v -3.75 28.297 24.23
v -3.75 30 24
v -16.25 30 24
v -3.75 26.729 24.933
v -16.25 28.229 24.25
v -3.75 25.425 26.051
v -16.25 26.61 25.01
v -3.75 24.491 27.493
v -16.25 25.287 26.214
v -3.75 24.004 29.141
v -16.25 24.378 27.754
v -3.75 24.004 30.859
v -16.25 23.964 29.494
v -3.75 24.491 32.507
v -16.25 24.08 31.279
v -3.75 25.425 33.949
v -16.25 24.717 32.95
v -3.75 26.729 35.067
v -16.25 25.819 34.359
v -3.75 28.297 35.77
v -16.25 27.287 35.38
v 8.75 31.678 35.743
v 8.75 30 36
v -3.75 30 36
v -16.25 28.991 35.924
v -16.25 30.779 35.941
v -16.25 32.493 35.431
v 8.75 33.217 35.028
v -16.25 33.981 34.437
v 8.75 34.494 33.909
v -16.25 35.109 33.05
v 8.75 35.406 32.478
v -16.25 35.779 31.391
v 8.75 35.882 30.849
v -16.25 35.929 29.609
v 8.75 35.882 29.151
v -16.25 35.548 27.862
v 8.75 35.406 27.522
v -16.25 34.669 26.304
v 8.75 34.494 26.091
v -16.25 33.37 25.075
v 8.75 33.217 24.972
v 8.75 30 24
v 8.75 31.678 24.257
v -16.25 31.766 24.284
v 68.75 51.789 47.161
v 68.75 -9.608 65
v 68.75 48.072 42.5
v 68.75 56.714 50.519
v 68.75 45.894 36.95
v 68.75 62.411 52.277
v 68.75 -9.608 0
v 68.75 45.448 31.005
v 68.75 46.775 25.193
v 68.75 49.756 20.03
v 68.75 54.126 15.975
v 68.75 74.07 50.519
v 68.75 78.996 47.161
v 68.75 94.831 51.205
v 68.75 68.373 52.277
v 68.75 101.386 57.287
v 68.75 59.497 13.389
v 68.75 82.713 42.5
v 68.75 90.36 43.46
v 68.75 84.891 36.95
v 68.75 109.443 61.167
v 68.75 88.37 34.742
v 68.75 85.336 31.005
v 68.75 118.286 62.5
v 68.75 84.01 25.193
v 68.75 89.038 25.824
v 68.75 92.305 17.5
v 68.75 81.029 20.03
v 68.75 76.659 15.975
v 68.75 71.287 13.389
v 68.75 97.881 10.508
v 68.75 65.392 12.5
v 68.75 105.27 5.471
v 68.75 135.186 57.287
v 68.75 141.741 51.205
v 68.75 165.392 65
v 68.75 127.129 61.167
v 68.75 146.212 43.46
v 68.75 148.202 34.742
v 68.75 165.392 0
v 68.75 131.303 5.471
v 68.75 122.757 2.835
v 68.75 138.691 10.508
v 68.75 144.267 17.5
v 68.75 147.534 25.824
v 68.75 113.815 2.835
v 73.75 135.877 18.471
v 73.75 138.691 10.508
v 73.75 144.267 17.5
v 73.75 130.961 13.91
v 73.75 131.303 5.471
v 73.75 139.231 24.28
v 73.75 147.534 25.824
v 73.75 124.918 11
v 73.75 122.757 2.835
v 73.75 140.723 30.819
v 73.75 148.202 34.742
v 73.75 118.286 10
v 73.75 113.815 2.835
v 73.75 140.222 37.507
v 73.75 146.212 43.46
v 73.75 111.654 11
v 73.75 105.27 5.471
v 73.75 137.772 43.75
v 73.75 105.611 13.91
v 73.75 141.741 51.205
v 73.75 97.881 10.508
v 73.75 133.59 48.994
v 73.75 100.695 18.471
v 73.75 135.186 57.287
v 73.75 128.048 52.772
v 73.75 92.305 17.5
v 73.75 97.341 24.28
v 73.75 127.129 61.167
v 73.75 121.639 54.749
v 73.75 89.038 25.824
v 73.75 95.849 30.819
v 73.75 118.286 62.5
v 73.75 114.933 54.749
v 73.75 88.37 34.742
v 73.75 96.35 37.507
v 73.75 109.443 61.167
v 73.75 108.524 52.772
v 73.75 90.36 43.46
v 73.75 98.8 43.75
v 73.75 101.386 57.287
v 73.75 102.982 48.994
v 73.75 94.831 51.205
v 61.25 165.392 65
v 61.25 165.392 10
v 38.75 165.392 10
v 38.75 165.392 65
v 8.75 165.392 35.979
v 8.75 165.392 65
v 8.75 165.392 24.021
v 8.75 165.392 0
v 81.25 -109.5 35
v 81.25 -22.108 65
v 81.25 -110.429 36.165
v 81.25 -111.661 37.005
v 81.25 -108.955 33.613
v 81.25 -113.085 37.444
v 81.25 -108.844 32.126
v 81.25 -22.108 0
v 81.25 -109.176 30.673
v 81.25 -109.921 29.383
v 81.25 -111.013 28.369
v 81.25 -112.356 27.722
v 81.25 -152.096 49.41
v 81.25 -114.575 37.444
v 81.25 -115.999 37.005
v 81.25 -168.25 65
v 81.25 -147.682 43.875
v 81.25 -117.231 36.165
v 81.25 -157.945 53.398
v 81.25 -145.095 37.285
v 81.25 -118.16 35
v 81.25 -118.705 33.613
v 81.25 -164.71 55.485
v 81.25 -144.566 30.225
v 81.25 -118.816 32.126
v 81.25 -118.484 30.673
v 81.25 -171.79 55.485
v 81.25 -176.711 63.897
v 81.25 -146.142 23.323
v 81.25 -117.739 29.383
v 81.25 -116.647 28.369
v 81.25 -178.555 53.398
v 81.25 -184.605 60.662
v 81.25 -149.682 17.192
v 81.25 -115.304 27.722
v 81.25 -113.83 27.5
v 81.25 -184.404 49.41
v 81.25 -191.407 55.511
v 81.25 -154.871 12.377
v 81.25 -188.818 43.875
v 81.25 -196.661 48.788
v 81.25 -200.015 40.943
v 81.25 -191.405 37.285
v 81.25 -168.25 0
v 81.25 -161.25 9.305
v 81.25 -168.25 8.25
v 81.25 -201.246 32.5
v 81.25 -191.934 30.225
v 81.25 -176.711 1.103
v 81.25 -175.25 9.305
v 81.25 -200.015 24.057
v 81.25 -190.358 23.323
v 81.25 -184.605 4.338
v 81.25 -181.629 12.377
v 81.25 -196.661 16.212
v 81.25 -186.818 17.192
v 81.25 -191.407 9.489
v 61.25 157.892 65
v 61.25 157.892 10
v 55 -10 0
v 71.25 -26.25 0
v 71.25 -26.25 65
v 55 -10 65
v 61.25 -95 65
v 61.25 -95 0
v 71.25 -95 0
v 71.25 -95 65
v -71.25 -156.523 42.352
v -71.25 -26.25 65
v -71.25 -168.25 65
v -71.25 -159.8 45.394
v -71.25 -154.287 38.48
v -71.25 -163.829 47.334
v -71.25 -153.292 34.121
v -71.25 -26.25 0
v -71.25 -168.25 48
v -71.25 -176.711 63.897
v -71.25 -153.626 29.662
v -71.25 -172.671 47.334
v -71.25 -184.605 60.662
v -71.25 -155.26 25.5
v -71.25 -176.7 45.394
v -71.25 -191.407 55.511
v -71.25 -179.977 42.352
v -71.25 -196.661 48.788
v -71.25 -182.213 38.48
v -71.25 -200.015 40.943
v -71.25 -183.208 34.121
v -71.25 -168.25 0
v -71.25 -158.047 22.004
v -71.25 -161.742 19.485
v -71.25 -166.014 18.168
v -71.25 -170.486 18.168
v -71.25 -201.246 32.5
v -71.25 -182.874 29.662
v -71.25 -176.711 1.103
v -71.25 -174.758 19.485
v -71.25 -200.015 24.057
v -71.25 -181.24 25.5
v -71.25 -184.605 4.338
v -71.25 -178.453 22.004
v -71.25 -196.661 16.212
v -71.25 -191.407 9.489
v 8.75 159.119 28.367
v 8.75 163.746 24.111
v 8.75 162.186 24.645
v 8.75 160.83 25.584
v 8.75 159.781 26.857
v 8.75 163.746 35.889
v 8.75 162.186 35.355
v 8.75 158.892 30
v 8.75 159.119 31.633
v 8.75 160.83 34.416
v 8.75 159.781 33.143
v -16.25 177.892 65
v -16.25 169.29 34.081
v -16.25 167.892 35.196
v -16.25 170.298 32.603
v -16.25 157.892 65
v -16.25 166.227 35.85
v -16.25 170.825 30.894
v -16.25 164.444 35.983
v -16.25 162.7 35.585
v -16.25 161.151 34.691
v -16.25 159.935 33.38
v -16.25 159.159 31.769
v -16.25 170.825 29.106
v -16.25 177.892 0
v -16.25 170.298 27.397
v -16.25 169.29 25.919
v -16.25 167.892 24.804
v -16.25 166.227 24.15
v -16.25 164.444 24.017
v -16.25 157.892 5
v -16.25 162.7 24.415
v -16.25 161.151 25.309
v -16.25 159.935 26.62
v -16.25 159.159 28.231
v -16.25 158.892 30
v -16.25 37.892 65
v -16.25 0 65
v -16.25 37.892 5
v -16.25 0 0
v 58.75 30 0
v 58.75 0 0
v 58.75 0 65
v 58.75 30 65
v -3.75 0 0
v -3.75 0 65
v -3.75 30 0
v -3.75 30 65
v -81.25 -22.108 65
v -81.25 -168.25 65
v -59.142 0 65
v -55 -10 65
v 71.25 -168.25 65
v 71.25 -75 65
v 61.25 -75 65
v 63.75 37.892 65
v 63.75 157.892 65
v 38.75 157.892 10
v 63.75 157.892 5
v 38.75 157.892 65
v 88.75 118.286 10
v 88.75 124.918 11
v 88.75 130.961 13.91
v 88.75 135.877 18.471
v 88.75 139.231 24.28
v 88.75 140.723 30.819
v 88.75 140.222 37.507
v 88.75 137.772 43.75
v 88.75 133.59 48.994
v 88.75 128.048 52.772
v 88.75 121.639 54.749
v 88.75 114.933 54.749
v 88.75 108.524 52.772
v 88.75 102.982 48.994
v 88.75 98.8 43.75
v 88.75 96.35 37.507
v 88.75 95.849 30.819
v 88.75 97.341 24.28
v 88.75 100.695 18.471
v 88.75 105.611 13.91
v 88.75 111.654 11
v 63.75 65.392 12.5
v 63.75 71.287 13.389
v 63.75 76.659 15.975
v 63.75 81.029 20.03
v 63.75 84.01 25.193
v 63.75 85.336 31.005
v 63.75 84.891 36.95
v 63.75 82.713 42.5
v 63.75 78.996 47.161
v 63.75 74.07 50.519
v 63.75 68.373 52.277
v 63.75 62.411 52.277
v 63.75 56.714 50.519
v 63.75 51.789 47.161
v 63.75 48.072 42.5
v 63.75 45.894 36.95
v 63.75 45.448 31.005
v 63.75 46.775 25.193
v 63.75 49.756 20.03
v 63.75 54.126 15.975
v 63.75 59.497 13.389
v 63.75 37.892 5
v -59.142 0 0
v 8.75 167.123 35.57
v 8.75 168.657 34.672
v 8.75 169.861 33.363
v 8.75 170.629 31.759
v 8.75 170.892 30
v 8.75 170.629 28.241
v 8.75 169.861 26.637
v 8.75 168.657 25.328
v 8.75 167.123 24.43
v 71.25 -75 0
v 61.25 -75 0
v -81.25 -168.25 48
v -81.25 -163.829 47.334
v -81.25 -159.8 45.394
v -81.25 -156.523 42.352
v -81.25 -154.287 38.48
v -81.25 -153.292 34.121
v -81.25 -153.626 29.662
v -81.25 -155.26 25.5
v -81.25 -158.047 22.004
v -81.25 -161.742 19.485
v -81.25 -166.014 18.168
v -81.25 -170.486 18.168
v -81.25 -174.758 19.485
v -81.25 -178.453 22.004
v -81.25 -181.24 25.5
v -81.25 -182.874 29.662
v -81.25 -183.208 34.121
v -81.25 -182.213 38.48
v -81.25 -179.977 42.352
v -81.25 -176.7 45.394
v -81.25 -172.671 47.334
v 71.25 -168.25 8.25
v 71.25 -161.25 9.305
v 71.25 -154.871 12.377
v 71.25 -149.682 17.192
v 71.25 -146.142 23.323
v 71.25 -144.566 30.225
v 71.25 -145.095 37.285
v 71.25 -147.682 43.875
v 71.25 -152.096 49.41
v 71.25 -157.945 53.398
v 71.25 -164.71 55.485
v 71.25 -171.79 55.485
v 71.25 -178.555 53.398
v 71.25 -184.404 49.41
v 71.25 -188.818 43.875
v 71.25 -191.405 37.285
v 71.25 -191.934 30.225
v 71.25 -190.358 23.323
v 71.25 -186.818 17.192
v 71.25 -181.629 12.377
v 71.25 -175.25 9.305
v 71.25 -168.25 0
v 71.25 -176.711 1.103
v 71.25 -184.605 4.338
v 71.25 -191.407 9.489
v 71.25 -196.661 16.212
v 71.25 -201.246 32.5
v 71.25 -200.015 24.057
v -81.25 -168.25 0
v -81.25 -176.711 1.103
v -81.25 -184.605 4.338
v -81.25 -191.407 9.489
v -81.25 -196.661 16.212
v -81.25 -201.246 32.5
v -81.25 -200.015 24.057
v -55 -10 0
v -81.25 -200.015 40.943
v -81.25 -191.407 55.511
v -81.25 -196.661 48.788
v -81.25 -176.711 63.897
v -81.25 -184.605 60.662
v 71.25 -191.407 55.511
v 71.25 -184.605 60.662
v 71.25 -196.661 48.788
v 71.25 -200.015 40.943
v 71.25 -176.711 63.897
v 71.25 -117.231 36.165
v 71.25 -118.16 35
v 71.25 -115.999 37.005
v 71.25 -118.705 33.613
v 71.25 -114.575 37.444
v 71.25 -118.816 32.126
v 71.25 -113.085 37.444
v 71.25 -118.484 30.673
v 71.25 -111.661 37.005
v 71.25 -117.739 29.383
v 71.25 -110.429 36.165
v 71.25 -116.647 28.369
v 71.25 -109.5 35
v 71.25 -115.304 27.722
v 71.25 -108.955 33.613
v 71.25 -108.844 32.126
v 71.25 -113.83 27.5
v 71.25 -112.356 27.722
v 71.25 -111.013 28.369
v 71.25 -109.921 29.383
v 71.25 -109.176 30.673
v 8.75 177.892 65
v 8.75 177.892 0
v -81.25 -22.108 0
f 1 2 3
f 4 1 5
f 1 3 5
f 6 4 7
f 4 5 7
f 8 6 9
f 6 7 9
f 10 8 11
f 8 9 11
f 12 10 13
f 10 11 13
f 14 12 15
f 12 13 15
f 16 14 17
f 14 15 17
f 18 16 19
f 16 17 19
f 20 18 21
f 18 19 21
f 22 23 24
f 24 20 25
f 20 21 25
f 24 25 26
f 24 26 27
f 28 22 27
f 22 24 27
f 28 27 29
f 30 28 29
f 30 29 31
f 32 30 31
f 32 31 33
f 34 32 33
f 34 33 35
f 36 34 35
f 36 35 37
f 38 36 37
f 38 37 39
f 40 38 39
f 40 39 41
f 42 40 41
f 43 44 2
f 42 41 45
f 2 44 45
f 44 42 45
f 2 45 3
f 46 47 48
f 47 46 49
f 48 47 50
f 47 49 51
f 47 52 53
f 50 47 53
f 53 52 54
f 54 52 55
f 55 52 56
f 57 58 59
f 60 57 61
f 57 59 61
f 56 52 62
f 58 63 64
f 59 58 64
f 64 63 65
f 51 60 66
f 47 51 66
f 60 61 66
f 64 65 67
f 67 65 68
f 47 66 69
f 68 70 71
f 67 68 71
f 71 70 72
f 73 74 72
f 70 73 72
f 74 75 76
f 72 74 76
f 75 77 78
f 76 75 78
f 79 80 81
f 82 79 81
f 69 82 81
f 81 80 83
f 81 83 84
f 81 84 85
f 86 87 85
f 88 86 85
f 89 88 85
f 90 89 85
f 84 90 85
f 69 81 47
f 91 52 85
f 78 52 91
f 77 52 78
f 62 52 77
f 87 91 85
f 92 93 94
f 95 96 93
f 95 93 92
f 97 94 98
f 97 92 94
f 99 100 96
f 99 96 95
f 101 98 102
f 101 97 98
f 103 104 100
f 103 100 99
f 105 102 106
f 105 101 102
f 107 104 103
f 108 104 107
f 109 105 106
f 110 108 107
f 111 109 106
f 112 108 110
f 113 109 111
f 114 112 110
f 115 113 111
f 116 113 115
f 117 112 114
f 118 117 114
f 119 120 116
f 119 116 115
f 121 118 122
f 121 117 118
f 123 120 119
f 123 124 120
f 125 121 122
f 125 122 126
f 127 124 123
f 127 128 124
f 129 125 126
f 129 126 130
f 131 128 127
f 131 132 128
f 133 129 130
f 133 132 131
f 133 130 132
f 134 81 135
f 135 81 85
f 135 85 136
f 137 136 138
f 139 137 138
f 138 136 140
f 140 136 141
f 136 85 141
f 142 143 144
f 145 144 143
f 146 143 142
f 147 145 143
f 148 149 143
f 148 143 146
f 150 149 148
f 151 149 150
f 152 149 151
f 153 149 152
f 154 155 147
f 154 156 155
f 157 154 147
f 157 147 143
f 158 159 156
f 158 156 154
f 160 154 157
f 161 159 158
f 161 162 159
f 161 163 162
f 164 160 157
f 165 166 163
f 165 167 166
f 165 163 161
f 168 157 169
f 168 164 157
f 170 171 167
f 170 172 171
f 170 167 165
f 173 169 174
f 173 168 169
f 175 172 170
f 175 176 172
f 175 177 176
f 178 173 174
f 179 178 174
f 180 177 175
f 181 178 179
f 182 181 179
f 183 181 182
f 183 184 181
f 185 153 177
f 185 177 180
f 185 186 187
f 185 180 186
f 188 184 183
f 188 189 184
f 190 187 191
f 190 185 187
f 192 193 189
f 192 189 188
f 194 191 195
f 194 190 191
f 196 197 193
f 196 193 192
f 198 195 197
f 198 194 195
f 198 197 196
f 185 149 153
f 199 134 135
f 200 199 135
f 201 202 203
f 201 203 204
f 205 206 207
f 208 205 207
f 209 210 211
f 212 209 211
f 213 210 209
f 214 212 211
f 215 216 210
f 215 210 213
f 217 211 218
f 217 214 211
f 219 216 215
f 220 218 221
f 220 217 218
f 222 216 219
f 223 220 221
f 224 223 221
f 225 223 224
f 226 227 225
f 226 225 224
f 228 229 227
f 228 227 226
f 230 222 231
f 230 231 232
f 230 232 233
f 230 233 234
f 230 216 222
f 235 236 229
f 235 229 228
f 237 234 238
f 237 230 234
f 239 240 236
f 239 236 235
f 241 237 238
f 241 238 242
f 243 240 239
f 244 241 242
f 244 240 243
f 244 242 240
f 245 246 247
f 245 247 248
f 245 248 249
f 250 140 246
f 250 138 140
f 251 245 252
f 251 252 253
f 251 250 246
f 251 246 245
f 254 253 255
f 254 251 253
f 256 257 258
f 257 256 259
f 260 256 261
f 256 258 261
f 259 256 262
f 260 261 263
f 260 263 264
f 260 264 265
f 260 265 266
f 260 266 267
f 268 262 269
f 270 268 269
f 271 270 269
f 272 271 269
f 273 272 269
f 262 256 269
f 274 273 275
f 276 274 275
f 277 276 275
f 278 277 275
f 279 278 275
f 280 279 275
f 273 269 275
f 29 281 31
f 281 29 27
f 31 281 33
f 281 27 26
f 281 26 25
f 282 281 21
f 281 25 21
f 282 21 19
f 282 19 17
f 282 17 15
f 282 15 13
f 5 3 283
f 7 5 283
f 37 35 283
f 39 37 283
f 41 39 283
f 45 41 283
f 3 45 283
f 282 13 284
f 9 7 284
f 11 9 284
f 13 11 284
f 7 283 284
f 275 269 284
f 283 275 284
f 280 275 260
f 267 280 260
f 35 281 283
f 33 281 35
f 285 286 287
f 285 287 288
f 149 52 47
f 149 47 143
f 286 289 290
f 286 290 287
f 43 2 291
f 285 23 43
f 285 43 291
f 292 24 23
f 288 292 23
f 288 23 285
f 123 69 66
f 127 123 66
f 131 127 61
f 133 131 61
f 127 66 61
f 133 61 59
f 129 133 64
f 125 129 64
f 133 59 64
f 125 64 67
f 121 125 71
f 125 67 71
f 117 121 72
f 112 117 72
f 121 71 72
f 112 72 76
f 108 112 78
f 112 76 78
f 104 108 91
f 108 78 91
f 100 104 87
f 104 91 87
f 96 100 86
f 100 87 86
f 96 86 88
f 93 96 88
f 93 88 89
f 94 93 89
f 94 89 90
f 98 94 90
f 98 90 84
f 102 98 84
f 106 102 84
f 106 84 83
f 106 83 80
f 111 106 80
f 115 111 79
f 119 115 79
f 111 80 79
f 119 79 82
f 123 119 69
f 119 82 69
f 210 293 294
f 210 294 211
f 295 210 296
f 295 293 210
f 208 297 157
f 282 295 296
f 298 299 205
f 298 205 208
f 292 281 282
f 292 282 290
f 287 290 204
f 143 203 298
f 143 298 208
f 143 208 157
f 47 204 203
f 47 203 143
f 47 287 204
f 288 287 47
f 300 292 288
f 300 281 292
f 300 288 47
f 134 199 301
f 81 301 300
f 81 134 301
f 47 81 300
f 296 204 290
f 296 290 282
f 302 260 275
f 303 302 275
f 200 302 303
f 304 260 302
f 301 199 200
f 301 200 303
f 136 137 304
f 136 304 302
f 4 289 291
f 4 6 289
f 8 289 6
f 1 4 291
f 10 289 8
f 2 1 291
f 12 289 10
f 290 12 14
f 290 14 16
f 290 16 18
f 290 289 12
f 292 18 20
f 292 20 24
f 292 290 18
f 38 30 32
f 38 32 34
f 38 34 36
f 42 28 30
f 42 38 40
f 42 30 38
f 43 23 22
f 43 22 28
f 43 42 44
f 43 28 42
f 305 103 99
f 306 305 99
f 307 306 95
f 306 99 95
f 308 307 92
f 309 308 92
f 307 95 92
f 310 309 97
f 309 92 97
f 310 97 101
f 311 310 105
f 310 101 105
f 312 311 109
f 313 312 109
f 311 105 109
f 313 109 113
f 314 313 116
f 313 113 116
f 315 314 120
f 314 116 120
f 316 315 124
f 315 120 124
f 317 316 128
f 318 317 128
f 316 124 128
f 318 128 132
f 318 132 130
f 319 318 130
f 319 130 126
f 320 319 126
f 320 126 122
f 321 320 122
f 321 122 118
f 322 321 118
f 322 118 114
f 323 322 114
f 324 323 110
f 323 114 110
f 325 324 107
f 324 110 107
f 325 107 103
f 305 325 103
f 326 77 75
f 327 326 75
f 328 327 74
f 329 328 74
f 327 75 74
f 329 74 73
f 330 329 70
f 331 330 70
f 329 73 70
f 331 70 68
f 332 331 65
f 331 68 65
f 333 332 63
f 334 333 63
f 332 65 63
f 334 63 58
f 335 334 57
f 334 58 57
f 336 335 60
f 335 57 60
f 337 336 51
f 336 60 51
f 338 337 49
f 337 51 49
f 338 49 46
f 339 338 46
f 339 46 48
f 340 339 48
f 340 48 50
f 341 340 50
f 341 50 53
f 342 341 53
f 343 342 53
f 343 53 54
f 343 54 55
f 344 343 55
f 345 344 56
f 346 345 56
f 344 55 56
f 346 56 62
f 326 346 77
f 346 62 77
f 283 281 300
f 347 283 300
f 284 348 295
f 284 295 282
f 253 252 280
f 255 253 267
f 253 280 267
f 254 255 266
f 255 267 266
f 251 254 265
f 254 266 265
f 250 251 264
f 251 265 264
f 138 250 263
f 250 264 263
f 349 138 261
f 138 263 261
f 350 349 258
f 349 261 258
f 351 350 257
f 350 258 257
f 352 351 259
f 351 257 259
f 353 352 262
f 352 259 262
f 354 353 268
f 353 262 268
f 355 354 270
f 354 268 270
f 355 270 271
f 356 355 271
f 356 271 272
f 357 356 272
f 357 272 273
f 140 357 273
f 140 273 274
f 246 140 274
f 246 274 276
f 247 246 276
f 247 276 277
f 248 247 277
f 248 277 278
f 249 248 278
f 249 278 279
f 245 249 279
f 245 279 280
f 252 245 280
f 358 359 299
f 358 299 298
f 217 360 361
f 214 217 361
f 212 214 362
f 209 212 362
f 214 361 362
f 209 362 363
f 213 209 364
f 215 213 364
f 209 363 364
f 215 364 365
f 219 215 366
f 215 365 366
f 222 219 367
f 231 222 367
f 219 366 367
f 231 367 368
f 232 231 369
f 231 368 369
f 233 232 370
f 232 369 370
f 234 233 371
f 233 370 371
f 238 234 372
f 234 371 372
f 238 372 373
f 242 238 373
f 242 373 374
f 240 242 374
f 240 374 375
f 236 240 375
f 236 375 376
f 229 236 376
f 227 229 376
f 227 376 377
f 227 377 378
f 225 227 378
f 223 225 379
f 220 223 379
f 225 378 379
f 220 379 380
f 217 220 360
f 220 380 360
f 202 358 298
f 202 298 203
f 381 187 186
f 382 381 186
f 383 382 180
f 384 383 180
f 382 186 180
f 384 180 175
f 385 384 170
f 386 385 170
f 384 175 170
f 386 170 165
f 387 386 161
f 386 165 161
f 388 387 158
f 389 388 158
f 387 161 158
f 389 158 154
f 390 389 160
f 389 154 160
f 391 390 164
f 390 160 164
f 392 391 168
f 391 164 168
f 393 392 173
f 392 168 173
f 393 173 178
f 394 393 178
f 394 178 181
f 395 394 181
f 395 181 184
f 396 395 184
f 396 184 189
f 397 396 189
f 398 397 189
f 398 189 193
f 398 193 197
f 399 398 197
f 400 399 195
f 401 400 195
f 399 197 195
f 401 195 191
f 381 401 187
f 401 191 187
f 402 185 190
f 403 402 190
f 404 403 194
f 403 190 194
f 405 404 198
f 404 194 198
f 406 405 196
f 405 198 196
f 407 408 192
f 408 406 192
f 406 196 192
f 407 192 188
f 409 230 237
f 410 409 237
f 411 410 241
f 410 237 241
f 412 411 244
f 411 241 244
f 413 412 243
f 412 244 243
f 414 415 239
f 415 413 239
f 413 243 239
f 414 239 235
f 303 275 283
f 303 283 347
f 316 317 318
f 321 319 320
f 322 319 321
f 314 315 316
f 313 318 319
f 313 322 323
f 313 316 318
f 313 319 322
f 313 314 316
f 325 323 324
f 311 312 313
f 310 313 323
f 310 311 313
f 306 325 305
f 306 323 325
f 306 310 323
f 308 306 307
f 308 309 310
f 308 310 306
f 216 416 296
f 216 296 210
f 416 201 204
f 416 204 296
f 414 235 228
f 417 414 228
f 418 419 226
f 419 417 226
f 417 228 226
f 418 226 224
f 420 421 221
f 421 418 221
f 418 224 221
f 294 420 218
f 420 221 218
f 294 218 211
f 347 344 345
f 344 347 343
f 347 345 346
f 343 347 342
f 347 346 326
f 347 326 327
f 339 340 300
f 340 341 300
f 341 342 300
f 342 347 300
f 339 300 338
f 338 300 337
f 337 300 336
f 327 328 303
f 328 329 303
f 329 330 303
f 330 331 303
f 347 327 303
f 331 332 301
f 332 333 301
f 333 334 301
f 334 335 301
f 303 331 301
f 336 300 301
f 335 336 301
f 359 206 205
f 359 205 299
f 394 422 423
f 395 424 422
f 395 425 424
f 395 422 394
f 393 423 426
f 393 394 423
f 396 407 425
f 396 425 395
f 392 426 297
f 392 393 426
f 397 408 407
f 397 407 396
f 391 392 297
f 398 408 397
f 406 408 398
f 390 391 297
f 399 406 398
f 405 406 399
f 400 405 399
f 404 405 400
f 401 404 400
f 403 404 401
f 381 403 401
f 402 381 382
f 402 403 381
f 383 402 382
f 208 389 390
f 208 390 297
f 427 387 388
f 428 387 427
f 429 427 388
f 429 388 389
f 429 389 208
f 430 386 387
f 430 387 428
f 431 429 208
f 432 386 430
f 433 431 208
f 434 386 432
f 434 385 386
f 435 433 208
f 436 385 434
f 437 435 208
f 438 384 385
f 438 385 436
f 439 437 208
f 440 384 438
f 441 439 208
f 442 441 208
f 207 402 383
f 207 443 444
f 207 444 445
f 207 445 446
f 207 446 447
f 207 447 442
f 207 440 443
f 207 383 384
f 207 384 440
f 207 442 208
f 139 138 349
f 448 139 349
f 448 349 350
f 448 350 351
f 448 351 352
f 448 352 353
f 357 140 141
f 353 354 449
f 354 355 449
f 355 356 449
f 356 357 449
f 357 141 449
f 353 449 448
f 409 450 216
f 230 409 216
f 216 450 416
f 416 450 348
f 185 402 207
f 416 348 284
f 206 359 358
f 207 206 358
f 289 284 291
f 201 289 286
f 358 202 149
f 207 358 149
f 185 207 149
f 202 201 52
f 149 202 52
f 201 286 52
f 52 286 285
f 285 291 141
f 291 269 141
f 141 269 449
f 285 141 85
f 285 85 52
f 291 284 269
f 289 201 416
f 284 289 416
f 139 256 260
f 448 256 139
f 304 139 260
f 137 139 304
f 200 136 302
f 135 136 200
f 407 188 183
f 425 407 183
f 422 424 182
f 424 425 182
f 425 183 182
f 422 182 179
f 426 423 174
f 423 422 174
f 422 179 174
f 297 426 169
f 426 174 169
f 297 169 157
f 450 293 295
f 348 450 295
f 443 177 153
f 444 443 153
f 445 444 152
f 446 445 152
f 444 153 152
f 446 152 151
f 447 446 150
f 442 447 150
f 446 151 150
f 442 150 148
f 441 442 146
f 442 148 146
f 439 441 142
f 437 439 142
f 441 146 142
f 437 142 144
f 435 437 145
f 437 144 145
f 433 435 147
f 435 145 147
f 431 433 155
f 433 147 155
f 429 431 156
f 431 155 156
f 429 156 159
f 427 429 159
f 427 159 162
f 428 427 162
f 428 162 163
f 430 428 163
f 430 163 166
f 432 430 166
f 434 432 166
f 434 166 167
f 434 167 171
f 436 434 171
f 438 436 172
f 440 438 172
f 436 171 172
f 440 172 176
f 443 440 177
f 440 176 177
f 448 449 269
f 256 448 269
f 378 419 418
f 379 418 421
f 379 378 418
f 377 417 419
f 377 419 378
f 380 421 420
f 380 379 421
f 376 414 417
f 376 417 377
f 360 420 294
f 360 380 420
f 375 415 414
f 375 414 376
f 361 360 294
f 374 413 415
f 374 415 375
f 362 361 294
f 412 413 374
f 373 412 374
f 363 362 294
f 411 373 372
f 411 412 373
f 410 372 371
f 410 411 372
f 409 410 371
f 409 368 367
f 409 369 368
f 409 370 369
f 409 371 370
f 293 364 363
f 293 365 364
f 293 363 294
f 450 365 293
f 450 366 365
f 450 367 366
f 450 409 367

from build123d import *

# Parameters (mm, degrees)
BOSS_EXTRUDE1_DEPTH = 65
BOSS_EXTRUDE2_DEPTH = 65
SKETCH3_W           = 62.5
SKETCH3_H           = 30
CUT_EXTRUDE1_DEPTH  = 65
SKETCH5_W           = 80
SKETCH5_H           = 120
CUT_EXTRUDE2_DEPTH  = 60
SKETCH6_R           = 6
CUT_EXTRUDE3_DEPTH  = 25
FILLET1_R           = 33
SKETCH7_R           = 15
CUT_EXTRUDE4_DEPTH  = 10
SKETCH8_R           = 23.75
CUT_EXTRUDE5_DEPTH  = 10
SKETCH10_W          = 22.5
SKETCH10_H          = 55
CUT_EXTRUDE7_DEPTH  = 25
SKETCH11_R          = 20
CUT_EXTRUDE8_DEPTH  = 5
SKETCH12_R          = 30
BOSS_EXTRUDE3_DEPTH = 5
SKETCH13_R          = 22.5
BOSS_EXTRUDE4_DEPTH = 15
SKETCH14_W          = 10
SKETCH14_H          = 20
BOSS_EXTRUDE5_DEPTH = 65
SKETCH15_R          = 5
CUT_EXTRUDE9_DEPTH  = 10


with BuildPart() as part:
    # Sketch1 → Boss-Extrude1 (new body)
    with BuildSketch(Plane.XY):
        Polygon((-59.142135624, 0), (59.142135624, 0), (81.25, -22.107864376), (81.25, -201.25), (71.25, -201.25), (71.25, -26.25), (55, -10), (-55, -10), (-71.25, -26.25), (-71.25, -201.25), (-81.25, -201.25), (-81.25, -22.107864376), align=None)
    extrude(amount=BOSS_EXTRUDE1_DEPTH)

    # Sketch2 → Boss-Extrude2 (add)
    with BuildSketch(Plane.XY):
        Polygon((68.75, -9.607864376), (68.75, 165.392135624), (8.75, 165.392135624), (8.75, 177.892135624), (-16.25, 177.892135624), (-16.25, 0), (59.142135624, 0), align=None)
    extrude(amount=BOSS_EXTRUDE2_DEPTH)

    # Sketch3 → Cut-Extrude1 (cut)
    with BuildSketch(Plane.XY.offset(65)):
        with Locations((27.5, 15)):
            Rectangle(SKETCH3_W, SKETCH3_H)
    extrude(amount=-CUT_EXTRUDE1_DEPTH, mode=Mode.SUBTRACT)

    # Sketch5 → Cut-Extrude2 (cut)
    with BuildSketch(Plane.XY.offset(65)):
        with Locations((23.75, 97.892135624)):
            Rectangle(SKETCH5_W, SKETCH5_H)
    extrude(amount=-CUT_EXTRUDE2_DEPTH, mode=Mode.SUBTRACT)

    # Sketch6 → Cut-Extrude3 (cut)
    with BuildSketch(Plane.ZY.offset(16.25)):
        with Locations(Location((30, 164.892135624, 0), (0, 0, 270))):
            Circle(SKETCH6_R)
        with Locations(Location((30, 29.942135624, 0), (0, 0, 179.447427343))):
            Circle(SKETCH6_R)
    extrude(amount=-CUT_EXTRUDE3_DEPTH, mode=Mode.SUBTRACT)

    # Fillet1
    # the kernel refuses this fillet: 33 mm, written as the material it takes off along each edge
    with BuildSketch(Plane(origin=(163.75, -201.25, 65), x_dir=(0, 1, 0), z_dir=(-1, 0, 0)), Plane(origin=(11.25, -201.25, 65), x_dir=(0, 1, 0), z_dir=(-1, 0, 0))) as fillet1_piece_1:
        with BuildLine():
            CenterArc((FILLET1_R, FILLET1_R), FILLET1_R, 180, 90)
            Line((0, FILLET1_R), (0, 0))
            Line((0, 0), (FILLET1_R, 0))
        make_face()
    extrude(amount=175, mode=Mode.SUBTRACT)
    with BuildSketch(Plane(origin=(163.75, -201.25, 0), x_dir=(0, 1, 0), z_dir=(-1, 0, 0)), Plane(origin=(11.25, -201.25, 0), x_dir=(0, 1, 0), z_dir=(-1, 0, 0))) as fillet1_piece_2:
        with BuildLine():
            CenterArc((FILLET1_R, -FILLET1_R), FILLET1_R, 90, 90)
            Line((0, -FILLET1_R), (0, 0))
            Line((0, 0), (FILLET1_R, 0))
        make_face()
    extrude(amount=175, mode=Mode.SUBTRACT)

    # Sketch7 → Cut-Extrude4 (cut)
    with BuildSketch(Plane.ZY.offset(81.25)):
        with Locations((33, -168.25)):
            Circle(SKETCH7_R)
    extrude(amount=-CUT_EXTRUDE4_DEPTH, mode=Mode.SUBTRACT)

    # Sketch8 → Cut-Extrude5 (cut)
    with BuildSketch(Plane(origin=(81.25, 0, 0), x_dir=(0, 0, -1), z_dir=(1, 0, 0))):
        with Locations((-32, -168.25)):
            Circle(SKETCH8_R)
    extrude(amount=-CUT_EXTRUDE5_DEPTH, mode=Mode.SUBTRACT)

    # Sketch10 → Cut-Extrude7 (cut)
    with BuildSketch(Plane(origin=(0, 165.392135624, 0), x_dir=(1, 0, 0), z_dir=(0, 1, 0))):
        with Locations((50, -37.5)):
            Rectangle(SKETCH10_W, SKETCH10_H)
    extrude(amount=-CUT_EXTRUDE7_DEPTH, mode=Mode.SUBTRACT)

    # Sketch11 → Cut-Extrude8 (cut)
    with BuildSketch(Plane(origin=(68.75, 0, 0), x_dir=(0, 0, -1), z_dir=(1, 0, 0))):
        with Locations((-32.5, 65.392135624)):
            Circle(SKETCH11_R)
    extrude(amount=-CUT_EXTRUDE8_DEPTH, mode=Mode.SUBTRACT)

    # Sketch12 → Boss-Extrude3 (add)
    with BuildSketch(Plane(origin=(68.75, 0, 0), x_dir=(0, 0, -1), z_dir=(1, 0, 0))):
        with Locations(Location((-32.5, 118.286013704, 0), (0, 0, 180))):
            Circle(SKETCH12_R)
    extrude(amount=BOSS_EXTRUDE3_DEPTH)

    # Sketch13 → Boss-Extrude4 (add)
    with BuildSketch(Plane(origin=(73.75, 0, 0), x_dir=(0, 0, -1), z_dir=(1, 0, 0))):
        with Locations((-32.5, 118.286013704)):
            Circle(SKETCH13_R)
    extrude(amount=BOSS_EXTRUDE4_DEPTH)

    # Sketch14 → Boss-Extrude5 (add)
    with BuildSketch(Plane.XY):
        with Locations((66.25, -85)):
            Rectangle(SKETCH14_W, SKETCH14_H)
    extrude(amount=BOSS_EXTRUDE5_DEPTH)

    # Sketch15 → Cut-Extrude9 (cut)
    with BuildSketch(Plane(origin=(81.25, 0, 0), x_dir=(0, 0, -1), z_dir=(1, 0, 0))):
        with Locations((-32.5, -113.83)):
            Circle(SKETCH15_R)
    extrude(amount=-CUT_EXTRUDE9_DEPTH, mode=Mode.SUBTRACT)


solid = part.part
